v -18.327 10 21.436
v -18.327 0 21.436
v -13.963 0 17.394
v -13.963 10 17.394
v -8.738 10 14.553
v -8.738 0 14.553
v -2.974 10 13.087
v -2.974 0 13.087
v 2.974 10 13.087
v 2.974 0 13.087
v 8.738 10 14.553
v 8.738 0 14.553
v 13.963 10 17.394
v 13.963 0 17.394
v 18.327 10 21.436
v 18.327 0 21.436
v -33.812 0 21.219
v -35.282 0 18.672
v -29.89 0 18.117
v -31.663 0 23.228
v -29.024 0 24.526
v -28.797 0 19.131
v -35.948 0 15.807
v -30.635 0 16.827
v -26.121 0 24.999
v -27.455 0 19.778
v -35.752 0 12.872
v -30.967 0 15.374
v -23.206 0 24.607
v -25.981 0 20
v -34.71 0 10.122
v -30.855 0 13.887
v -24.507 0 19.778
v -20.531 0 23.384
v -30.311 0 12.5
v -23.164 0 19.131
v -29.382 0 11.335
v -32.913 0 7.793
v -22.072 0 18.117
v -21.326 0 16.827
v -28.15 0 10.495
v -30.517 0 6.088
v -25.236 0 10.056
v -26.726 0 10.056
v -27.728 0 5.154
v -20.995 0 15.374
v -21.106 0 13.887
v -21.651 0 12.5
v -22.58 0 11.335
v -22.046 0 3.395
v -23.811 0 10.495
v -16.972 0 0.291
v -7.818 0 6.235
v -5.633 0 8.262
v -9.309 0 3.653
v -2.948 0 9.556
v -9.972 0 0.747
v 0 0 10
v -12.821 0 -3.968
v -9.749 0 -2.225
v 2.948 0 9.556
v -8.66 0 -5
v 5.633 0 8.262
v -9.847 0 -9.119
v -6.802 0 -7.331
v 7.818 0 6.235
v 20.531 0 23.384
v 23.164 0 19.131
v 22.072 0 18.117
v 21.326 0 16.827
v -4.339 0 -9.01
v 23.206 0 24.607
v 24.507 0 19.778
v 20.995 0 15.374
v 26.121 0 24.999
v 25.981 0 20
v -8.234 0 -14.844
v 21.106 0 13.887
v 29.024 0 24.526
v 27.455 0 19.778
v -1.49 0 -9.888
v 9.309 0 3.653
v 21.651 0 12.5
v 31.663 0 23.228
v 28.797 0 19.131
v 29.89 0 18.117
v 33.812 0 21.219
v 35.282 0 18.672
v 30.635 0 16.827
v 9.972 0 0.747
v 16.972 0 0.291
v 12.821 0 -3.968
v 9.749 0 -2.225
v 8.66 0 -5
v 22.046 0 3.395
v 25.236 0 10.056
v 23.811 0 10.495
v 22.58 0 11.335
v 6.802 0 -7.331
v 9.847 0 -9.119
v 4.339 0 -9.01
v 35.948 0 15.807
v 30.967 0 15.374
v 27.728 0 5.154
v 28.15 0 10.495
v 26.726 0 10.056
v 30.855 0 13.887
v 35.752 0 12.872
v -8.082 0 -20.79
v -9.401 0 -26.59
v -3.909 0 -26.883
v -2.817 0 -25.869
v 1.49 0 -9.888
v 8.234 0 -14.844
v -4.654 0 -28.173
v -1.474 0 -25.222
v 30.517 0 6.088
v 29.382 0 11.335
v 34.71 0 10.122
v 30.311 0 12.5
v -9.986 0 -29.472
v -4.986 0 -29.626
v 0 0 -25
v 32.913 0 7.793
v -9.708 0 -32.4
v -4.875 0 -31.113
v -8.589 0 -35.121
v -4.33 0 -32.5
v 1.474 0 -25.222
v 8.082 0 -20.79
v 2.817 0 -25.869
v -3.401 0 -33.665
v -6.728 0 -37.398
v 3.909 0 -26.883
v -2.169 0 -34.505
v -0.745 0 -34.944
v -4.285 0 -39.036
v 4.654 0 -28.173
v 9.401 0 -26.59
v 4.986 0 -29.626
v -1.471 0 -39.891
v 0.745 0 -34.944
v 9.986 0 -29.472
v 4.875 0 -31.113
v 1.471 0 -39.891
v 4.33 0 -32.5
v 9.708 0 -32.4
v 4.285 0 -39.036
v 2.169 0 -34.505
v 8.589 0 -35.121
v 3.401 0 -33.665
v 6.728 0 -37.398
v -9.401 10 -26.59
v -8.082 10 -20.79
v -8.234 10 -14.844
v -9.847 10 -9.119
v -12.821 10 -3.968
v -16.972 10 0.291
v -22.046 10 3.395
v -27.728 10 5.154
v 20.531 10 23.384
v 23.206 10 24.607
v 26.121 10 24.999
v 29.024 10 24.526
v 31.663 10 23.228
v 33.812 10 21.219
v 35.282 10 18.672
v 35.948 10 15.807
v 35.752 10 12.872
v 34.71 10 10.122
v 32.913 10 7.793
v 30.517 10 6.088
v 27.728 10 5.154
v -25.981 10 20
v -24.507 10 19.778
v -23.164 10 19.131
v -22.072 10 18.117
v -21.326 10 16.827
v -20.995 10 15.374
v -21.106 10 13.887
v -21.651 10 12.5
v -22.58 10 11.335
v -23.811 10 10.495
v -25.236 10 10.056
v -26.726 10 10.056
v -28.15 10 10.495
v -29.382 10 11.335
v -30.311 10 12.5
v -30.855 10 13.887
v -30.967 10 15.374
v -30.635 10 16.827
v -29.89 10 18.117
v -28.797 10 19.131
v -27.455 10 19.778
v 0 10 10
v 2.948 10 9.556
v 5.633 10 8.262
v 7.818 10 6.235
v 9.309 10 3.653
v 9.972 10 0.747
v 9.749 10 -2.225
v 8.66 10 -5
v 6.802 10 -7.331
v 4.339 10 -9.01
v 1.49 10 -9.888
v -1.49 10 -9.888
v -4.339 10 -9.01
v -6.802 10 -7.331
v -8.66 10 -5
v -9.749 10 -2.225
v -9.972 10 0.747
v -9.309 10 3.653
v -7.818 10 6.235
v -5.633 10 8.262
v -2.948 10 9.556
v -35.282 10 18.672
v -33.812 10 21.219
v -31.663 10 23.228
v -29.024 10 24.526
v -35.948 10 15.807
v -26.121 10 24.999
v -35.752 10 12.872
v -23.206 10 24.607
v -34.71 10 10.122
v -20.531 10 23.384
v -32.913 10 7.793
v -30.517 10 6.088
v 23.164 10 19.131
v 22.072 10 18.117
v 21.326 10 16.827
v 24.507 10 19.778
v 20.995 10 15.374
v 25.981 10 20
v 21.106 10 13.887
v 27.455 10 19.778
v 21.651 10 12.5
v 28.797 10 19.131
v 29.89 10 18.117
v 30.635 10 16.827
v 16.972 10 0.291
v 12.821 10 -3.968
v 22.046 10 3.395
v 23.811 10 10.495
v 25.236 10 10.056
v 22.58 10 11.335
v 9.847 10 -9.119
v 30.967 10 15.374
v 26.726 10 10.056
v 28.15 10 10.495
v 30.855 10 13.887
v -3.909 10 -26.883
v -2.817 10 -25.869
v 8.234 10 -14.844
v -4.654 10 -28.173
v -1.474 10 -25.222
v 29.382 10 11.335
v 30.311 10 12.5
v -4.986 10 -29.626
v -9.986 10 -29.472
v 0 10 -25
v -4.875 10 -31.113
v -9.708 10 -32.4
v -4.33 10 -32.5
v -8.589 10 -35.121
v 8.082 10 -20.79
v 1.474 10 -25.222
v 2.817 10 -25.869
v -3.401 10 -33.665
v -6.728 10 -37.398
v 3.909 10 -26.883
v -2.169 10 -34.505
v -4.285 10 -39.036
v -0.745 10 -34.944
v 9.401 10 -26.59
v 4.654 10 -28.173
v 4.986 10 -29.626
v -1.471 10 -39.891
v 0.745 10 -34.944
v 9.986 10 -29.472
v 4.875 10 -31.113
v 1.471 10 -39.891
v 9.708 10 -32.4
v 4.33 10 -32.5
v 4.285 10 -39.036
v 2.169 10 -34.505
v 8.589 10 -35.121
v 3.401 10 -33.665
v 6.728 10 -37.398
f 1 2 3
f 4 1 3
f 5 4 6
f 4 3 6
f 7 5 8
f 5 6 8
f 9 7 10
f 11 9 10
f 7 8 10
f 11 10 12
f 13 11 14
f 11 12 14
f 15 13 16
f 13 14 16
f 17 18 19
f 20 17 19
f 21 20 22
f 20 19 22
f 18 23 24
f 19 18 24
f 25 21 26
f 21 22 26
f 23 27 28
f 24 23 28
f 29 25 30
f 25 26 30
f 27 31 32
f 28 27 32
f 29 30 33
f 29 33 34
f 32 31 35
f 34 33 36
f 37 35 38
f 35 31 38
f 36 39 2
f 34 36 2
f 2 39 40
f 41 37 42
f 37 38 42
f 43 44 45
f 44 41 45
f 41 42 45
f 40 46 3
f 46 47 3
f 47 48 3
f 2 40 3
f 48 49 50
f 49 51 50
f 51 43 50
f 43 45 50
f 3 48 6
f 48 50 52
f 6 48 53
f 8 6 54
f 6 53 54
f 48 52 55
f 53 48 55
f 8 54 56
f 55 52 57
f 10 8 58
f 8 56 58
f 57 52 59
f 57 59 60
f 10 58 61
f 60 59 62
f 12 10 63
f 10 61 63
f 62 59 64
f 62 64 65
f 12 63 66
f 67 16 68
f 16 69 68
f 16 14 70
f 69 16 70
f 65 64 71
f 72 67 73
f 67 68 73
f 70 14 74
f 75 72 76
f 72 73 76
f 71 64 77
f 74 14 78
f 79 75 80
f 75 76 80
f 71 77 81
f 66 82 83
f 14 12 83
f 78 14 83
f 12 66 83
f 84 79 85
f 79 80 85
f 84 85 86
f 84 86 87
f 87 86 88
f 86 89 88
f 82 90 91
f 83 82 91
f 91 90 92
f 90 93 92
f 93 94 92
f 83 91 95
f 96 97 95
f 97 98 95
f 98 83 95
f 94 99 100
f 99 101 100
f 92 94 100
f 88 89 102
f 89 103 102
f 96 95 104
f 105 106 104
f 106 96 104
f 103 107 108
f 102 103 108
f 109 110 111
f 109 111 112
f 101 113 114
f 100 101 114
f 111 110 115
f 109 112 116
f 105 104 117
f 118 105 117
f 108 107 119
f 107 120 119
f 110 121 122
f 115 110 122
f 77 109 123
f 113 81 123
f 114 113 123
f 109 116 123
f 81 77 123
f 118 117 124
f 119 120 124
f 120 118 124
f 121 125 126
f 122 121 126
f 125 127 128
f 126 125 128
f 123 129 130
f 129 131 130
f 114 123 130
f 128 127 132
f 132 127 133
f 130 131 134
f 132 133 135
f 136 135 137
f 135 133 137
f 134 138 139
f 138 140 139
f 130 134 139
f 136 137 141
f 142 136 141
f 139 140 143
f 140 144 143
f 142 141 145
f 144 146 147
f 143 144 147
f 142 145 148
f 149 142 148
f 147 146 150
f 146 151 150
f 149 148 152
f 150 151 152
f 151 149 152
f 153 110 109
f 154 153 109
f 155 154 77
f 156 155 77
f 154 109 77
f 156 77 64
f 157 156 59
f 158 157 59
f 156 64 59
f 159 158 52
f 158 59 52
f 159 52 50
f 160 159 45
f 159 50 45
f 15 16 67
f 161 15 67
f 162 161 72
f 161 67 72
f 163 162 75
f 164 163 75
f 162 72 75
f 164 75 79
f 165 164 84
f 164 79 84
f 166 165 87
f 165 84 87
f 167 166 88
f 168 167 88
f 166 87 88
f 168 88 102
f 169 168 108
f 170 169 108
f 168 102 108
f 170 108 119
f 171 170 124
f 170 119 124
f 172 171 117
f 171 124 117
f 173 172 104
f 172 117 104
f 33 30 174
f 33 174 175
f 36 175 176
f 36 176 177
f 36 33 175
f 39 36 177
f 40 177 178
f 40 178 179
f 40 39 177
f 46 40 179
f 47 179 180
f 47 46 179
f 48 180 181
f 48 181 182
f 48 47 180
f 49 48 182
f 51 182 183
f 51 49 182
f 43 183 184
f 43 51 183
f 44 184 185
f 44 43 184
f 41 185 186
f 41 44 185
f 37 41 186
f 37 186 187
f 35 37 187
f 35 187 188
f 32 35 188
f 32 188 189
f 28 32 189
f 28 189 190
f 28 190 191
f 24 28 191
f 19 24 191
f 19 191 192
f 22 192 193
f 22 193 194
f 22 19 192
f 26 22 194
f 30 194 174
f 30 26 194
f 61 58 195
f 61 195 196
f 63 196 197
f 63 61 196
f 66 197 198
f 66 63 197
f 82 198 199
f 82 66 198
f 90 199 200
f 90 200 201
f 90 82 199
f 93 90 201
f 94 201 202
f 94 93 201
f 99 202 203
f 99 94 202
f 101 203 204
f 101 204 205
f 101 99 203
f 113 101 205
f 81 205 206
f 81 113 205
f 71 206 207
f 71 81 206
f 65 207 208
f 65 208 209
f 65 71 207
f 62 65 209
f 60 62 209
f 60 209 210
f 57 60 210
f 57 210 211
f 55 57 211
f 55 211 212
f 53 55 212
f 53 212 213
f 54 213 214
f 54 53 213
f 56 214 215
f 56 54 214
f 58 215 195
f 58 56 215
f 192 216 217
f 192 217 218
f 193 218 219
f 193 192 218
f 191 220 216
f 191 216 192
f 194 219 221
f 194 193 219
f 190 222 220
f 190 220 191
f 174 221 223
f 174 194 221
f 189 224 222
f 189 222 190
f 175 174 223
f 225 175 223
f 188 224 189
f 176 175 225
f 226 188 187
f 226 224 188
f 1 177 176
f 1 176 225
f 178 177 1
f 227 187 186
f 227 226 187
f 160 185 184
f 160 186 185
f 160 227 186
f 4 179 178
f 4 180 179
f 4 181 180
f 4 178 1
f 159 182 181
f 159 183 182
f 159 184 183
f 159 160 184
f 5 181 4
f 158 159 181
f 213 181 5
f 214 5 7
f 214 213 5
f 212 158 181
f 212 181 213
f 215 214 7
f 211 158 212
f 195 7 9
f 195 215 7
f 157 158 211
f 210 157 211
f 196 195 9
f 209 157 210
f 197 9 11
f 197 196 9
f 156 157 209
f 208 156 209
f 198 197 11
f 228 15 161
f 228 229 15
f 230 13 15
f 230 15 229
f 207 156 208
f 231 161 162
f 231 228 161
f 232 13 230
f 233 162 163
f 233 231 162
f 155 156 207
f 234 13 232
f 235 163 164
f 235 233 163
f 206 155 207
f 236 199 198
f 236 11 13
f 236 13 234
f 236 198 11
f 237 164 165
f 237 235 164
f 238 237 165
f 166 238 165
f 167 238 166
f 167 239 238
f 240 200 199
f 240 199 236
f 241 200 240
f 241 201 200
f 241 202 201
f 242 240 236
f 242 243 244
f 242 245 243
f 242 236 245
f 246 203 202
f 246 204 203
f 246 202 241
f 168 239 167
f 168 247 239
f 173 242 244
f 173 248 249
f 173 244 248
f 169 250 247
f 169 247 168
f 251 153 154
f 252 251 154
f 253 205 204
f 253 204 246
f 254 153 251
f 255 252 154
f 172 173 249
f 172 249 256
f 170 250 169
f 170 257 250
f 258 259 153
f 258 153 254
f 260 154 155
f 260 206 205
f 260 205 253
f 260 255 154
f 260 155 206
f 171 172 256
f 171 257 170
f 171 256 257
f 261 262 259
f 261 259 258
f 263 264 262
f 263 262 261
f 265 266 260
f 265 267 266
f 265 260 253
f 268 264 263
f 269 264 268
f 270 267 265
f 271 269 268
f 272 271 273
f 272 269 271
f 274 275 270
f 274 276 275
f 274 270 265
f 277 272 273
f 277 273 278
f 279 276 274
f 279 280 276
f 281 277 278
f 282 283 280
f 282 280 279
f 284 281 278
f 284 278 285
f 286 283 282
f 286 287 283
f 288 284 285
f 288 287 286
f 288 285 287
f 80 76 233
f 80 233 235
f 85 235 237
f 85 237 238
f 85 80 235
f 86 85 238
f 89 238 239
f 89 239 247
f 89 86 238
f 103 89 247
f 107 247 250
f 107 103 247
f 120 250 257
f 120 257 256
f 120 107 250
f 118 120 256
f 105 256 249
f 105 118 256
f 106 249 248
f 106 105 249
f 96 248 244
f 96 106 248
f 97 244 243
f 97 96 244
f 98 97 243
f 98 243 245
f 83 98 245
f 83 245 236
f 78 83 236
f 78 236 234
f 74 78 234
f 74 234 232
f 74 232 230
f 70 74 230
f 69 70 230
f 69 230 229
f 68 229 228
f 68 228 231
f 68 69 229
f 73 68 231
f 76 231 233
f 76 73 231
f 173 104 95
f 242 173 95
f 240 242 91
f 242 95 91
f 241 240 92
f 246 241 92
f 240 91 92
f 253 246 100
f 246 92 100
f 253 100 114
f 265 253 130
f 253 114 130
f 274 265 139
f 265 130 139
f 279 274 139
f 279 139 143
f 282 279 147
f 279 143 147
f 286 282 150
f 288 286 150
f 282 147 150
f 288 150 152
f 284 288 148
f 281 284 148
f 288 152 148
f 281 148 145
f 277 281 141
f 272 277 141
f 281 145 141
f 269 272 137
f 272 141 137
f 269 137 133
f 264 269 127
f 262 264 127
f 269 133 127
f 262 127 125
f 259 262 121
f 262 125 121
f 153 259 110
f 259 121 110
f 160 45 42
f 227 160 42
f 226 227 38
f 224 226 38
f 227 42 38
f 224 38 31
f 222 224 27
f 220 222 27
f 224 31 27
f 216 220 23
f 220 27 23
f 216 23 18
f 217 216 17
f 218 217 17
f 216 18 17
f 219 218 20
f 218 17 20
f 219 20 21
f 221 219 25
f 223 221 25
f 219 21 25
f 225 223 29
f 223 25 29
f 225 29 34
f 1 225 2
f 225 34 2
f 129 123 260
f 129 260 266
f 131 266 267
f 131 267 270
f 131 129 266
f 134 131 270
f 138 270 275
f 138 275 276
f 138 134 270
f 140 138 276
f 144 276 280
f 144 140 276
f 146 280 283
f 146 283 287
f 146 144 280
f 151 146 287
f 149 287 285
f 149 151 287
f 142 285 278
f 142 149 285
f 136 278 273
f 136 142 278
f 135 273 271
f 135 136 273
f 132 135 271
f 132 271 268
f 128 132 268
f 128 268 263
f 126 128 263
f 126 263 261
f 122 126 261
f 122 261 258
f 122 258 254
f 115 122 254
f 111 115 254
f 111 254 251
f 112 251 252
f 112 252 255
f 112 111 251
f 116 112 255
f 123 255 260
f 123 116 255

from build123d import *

# Parameters (mm, degrees)
SKETCH1_R           = 10
SKETCH1_R_2         = 5
BOSS_EXTRUDE1_DEPTH = 10


with BuildPart() as part:
    # Sketch1 → Boss-Extrude1 (new body)
    with BuildSketch(Plane(origin=(0, 0, 0), x_dir=(1, 0, 0), z_dir=(0, 1, 0))):
        with BuildLine():
            ThreePointArc((-9.400507195, 26.58965332), (-11.173070065, 6.45077501), (-27.72756885, -5.153748621))
            ThreePointArc((-27.72756885, -5.153748621), (-34.641016151, -20), (-18.327061655, -21.435904699))
            ThreePointArc((-18.327061655, -21.435904699), (0, -12.901550019), (18.327061655, -21.435904699))
            ThreePointArc((18.327061655, -21.435904699), (34.641016151, -20), (27.72756885, -5.153748621))
            ThreePointArc((27.72756885, -5.153748621), (11.173070065, 6.45077501), (9.400507195, 26.58965332))
            ThreePointArc((9.400507195, 26.58965332), (0, 40), (-9.400507195, 26.58965332))
        make_face()
        with Locations(Location((0, 0, 0), (0, 0, 270))):
            Circle(SKETCH1_R, mode=Mode.SUBTRACT)
        with Locations(Location((25.980762114, -15, 0), (0, 0, 270))):
            Circle(SKETCH1_R_2, mode=Mode.SUBTRACT)
        with Locations(Location((0, 30, 0), (0, 0, 270))):
            Circle(SKETCH1_R_2, mode=Mode.SUBTRACT)
        with Locations(Location((-25.980762114, -15, 0), (0, 0, 270))):
            Circle(SKETCH1_R_2, mode=Mode.SUBTRACT)
    extrude(amount=BOSS_EXTRUDE1_DEPTH)


solid = part.part
